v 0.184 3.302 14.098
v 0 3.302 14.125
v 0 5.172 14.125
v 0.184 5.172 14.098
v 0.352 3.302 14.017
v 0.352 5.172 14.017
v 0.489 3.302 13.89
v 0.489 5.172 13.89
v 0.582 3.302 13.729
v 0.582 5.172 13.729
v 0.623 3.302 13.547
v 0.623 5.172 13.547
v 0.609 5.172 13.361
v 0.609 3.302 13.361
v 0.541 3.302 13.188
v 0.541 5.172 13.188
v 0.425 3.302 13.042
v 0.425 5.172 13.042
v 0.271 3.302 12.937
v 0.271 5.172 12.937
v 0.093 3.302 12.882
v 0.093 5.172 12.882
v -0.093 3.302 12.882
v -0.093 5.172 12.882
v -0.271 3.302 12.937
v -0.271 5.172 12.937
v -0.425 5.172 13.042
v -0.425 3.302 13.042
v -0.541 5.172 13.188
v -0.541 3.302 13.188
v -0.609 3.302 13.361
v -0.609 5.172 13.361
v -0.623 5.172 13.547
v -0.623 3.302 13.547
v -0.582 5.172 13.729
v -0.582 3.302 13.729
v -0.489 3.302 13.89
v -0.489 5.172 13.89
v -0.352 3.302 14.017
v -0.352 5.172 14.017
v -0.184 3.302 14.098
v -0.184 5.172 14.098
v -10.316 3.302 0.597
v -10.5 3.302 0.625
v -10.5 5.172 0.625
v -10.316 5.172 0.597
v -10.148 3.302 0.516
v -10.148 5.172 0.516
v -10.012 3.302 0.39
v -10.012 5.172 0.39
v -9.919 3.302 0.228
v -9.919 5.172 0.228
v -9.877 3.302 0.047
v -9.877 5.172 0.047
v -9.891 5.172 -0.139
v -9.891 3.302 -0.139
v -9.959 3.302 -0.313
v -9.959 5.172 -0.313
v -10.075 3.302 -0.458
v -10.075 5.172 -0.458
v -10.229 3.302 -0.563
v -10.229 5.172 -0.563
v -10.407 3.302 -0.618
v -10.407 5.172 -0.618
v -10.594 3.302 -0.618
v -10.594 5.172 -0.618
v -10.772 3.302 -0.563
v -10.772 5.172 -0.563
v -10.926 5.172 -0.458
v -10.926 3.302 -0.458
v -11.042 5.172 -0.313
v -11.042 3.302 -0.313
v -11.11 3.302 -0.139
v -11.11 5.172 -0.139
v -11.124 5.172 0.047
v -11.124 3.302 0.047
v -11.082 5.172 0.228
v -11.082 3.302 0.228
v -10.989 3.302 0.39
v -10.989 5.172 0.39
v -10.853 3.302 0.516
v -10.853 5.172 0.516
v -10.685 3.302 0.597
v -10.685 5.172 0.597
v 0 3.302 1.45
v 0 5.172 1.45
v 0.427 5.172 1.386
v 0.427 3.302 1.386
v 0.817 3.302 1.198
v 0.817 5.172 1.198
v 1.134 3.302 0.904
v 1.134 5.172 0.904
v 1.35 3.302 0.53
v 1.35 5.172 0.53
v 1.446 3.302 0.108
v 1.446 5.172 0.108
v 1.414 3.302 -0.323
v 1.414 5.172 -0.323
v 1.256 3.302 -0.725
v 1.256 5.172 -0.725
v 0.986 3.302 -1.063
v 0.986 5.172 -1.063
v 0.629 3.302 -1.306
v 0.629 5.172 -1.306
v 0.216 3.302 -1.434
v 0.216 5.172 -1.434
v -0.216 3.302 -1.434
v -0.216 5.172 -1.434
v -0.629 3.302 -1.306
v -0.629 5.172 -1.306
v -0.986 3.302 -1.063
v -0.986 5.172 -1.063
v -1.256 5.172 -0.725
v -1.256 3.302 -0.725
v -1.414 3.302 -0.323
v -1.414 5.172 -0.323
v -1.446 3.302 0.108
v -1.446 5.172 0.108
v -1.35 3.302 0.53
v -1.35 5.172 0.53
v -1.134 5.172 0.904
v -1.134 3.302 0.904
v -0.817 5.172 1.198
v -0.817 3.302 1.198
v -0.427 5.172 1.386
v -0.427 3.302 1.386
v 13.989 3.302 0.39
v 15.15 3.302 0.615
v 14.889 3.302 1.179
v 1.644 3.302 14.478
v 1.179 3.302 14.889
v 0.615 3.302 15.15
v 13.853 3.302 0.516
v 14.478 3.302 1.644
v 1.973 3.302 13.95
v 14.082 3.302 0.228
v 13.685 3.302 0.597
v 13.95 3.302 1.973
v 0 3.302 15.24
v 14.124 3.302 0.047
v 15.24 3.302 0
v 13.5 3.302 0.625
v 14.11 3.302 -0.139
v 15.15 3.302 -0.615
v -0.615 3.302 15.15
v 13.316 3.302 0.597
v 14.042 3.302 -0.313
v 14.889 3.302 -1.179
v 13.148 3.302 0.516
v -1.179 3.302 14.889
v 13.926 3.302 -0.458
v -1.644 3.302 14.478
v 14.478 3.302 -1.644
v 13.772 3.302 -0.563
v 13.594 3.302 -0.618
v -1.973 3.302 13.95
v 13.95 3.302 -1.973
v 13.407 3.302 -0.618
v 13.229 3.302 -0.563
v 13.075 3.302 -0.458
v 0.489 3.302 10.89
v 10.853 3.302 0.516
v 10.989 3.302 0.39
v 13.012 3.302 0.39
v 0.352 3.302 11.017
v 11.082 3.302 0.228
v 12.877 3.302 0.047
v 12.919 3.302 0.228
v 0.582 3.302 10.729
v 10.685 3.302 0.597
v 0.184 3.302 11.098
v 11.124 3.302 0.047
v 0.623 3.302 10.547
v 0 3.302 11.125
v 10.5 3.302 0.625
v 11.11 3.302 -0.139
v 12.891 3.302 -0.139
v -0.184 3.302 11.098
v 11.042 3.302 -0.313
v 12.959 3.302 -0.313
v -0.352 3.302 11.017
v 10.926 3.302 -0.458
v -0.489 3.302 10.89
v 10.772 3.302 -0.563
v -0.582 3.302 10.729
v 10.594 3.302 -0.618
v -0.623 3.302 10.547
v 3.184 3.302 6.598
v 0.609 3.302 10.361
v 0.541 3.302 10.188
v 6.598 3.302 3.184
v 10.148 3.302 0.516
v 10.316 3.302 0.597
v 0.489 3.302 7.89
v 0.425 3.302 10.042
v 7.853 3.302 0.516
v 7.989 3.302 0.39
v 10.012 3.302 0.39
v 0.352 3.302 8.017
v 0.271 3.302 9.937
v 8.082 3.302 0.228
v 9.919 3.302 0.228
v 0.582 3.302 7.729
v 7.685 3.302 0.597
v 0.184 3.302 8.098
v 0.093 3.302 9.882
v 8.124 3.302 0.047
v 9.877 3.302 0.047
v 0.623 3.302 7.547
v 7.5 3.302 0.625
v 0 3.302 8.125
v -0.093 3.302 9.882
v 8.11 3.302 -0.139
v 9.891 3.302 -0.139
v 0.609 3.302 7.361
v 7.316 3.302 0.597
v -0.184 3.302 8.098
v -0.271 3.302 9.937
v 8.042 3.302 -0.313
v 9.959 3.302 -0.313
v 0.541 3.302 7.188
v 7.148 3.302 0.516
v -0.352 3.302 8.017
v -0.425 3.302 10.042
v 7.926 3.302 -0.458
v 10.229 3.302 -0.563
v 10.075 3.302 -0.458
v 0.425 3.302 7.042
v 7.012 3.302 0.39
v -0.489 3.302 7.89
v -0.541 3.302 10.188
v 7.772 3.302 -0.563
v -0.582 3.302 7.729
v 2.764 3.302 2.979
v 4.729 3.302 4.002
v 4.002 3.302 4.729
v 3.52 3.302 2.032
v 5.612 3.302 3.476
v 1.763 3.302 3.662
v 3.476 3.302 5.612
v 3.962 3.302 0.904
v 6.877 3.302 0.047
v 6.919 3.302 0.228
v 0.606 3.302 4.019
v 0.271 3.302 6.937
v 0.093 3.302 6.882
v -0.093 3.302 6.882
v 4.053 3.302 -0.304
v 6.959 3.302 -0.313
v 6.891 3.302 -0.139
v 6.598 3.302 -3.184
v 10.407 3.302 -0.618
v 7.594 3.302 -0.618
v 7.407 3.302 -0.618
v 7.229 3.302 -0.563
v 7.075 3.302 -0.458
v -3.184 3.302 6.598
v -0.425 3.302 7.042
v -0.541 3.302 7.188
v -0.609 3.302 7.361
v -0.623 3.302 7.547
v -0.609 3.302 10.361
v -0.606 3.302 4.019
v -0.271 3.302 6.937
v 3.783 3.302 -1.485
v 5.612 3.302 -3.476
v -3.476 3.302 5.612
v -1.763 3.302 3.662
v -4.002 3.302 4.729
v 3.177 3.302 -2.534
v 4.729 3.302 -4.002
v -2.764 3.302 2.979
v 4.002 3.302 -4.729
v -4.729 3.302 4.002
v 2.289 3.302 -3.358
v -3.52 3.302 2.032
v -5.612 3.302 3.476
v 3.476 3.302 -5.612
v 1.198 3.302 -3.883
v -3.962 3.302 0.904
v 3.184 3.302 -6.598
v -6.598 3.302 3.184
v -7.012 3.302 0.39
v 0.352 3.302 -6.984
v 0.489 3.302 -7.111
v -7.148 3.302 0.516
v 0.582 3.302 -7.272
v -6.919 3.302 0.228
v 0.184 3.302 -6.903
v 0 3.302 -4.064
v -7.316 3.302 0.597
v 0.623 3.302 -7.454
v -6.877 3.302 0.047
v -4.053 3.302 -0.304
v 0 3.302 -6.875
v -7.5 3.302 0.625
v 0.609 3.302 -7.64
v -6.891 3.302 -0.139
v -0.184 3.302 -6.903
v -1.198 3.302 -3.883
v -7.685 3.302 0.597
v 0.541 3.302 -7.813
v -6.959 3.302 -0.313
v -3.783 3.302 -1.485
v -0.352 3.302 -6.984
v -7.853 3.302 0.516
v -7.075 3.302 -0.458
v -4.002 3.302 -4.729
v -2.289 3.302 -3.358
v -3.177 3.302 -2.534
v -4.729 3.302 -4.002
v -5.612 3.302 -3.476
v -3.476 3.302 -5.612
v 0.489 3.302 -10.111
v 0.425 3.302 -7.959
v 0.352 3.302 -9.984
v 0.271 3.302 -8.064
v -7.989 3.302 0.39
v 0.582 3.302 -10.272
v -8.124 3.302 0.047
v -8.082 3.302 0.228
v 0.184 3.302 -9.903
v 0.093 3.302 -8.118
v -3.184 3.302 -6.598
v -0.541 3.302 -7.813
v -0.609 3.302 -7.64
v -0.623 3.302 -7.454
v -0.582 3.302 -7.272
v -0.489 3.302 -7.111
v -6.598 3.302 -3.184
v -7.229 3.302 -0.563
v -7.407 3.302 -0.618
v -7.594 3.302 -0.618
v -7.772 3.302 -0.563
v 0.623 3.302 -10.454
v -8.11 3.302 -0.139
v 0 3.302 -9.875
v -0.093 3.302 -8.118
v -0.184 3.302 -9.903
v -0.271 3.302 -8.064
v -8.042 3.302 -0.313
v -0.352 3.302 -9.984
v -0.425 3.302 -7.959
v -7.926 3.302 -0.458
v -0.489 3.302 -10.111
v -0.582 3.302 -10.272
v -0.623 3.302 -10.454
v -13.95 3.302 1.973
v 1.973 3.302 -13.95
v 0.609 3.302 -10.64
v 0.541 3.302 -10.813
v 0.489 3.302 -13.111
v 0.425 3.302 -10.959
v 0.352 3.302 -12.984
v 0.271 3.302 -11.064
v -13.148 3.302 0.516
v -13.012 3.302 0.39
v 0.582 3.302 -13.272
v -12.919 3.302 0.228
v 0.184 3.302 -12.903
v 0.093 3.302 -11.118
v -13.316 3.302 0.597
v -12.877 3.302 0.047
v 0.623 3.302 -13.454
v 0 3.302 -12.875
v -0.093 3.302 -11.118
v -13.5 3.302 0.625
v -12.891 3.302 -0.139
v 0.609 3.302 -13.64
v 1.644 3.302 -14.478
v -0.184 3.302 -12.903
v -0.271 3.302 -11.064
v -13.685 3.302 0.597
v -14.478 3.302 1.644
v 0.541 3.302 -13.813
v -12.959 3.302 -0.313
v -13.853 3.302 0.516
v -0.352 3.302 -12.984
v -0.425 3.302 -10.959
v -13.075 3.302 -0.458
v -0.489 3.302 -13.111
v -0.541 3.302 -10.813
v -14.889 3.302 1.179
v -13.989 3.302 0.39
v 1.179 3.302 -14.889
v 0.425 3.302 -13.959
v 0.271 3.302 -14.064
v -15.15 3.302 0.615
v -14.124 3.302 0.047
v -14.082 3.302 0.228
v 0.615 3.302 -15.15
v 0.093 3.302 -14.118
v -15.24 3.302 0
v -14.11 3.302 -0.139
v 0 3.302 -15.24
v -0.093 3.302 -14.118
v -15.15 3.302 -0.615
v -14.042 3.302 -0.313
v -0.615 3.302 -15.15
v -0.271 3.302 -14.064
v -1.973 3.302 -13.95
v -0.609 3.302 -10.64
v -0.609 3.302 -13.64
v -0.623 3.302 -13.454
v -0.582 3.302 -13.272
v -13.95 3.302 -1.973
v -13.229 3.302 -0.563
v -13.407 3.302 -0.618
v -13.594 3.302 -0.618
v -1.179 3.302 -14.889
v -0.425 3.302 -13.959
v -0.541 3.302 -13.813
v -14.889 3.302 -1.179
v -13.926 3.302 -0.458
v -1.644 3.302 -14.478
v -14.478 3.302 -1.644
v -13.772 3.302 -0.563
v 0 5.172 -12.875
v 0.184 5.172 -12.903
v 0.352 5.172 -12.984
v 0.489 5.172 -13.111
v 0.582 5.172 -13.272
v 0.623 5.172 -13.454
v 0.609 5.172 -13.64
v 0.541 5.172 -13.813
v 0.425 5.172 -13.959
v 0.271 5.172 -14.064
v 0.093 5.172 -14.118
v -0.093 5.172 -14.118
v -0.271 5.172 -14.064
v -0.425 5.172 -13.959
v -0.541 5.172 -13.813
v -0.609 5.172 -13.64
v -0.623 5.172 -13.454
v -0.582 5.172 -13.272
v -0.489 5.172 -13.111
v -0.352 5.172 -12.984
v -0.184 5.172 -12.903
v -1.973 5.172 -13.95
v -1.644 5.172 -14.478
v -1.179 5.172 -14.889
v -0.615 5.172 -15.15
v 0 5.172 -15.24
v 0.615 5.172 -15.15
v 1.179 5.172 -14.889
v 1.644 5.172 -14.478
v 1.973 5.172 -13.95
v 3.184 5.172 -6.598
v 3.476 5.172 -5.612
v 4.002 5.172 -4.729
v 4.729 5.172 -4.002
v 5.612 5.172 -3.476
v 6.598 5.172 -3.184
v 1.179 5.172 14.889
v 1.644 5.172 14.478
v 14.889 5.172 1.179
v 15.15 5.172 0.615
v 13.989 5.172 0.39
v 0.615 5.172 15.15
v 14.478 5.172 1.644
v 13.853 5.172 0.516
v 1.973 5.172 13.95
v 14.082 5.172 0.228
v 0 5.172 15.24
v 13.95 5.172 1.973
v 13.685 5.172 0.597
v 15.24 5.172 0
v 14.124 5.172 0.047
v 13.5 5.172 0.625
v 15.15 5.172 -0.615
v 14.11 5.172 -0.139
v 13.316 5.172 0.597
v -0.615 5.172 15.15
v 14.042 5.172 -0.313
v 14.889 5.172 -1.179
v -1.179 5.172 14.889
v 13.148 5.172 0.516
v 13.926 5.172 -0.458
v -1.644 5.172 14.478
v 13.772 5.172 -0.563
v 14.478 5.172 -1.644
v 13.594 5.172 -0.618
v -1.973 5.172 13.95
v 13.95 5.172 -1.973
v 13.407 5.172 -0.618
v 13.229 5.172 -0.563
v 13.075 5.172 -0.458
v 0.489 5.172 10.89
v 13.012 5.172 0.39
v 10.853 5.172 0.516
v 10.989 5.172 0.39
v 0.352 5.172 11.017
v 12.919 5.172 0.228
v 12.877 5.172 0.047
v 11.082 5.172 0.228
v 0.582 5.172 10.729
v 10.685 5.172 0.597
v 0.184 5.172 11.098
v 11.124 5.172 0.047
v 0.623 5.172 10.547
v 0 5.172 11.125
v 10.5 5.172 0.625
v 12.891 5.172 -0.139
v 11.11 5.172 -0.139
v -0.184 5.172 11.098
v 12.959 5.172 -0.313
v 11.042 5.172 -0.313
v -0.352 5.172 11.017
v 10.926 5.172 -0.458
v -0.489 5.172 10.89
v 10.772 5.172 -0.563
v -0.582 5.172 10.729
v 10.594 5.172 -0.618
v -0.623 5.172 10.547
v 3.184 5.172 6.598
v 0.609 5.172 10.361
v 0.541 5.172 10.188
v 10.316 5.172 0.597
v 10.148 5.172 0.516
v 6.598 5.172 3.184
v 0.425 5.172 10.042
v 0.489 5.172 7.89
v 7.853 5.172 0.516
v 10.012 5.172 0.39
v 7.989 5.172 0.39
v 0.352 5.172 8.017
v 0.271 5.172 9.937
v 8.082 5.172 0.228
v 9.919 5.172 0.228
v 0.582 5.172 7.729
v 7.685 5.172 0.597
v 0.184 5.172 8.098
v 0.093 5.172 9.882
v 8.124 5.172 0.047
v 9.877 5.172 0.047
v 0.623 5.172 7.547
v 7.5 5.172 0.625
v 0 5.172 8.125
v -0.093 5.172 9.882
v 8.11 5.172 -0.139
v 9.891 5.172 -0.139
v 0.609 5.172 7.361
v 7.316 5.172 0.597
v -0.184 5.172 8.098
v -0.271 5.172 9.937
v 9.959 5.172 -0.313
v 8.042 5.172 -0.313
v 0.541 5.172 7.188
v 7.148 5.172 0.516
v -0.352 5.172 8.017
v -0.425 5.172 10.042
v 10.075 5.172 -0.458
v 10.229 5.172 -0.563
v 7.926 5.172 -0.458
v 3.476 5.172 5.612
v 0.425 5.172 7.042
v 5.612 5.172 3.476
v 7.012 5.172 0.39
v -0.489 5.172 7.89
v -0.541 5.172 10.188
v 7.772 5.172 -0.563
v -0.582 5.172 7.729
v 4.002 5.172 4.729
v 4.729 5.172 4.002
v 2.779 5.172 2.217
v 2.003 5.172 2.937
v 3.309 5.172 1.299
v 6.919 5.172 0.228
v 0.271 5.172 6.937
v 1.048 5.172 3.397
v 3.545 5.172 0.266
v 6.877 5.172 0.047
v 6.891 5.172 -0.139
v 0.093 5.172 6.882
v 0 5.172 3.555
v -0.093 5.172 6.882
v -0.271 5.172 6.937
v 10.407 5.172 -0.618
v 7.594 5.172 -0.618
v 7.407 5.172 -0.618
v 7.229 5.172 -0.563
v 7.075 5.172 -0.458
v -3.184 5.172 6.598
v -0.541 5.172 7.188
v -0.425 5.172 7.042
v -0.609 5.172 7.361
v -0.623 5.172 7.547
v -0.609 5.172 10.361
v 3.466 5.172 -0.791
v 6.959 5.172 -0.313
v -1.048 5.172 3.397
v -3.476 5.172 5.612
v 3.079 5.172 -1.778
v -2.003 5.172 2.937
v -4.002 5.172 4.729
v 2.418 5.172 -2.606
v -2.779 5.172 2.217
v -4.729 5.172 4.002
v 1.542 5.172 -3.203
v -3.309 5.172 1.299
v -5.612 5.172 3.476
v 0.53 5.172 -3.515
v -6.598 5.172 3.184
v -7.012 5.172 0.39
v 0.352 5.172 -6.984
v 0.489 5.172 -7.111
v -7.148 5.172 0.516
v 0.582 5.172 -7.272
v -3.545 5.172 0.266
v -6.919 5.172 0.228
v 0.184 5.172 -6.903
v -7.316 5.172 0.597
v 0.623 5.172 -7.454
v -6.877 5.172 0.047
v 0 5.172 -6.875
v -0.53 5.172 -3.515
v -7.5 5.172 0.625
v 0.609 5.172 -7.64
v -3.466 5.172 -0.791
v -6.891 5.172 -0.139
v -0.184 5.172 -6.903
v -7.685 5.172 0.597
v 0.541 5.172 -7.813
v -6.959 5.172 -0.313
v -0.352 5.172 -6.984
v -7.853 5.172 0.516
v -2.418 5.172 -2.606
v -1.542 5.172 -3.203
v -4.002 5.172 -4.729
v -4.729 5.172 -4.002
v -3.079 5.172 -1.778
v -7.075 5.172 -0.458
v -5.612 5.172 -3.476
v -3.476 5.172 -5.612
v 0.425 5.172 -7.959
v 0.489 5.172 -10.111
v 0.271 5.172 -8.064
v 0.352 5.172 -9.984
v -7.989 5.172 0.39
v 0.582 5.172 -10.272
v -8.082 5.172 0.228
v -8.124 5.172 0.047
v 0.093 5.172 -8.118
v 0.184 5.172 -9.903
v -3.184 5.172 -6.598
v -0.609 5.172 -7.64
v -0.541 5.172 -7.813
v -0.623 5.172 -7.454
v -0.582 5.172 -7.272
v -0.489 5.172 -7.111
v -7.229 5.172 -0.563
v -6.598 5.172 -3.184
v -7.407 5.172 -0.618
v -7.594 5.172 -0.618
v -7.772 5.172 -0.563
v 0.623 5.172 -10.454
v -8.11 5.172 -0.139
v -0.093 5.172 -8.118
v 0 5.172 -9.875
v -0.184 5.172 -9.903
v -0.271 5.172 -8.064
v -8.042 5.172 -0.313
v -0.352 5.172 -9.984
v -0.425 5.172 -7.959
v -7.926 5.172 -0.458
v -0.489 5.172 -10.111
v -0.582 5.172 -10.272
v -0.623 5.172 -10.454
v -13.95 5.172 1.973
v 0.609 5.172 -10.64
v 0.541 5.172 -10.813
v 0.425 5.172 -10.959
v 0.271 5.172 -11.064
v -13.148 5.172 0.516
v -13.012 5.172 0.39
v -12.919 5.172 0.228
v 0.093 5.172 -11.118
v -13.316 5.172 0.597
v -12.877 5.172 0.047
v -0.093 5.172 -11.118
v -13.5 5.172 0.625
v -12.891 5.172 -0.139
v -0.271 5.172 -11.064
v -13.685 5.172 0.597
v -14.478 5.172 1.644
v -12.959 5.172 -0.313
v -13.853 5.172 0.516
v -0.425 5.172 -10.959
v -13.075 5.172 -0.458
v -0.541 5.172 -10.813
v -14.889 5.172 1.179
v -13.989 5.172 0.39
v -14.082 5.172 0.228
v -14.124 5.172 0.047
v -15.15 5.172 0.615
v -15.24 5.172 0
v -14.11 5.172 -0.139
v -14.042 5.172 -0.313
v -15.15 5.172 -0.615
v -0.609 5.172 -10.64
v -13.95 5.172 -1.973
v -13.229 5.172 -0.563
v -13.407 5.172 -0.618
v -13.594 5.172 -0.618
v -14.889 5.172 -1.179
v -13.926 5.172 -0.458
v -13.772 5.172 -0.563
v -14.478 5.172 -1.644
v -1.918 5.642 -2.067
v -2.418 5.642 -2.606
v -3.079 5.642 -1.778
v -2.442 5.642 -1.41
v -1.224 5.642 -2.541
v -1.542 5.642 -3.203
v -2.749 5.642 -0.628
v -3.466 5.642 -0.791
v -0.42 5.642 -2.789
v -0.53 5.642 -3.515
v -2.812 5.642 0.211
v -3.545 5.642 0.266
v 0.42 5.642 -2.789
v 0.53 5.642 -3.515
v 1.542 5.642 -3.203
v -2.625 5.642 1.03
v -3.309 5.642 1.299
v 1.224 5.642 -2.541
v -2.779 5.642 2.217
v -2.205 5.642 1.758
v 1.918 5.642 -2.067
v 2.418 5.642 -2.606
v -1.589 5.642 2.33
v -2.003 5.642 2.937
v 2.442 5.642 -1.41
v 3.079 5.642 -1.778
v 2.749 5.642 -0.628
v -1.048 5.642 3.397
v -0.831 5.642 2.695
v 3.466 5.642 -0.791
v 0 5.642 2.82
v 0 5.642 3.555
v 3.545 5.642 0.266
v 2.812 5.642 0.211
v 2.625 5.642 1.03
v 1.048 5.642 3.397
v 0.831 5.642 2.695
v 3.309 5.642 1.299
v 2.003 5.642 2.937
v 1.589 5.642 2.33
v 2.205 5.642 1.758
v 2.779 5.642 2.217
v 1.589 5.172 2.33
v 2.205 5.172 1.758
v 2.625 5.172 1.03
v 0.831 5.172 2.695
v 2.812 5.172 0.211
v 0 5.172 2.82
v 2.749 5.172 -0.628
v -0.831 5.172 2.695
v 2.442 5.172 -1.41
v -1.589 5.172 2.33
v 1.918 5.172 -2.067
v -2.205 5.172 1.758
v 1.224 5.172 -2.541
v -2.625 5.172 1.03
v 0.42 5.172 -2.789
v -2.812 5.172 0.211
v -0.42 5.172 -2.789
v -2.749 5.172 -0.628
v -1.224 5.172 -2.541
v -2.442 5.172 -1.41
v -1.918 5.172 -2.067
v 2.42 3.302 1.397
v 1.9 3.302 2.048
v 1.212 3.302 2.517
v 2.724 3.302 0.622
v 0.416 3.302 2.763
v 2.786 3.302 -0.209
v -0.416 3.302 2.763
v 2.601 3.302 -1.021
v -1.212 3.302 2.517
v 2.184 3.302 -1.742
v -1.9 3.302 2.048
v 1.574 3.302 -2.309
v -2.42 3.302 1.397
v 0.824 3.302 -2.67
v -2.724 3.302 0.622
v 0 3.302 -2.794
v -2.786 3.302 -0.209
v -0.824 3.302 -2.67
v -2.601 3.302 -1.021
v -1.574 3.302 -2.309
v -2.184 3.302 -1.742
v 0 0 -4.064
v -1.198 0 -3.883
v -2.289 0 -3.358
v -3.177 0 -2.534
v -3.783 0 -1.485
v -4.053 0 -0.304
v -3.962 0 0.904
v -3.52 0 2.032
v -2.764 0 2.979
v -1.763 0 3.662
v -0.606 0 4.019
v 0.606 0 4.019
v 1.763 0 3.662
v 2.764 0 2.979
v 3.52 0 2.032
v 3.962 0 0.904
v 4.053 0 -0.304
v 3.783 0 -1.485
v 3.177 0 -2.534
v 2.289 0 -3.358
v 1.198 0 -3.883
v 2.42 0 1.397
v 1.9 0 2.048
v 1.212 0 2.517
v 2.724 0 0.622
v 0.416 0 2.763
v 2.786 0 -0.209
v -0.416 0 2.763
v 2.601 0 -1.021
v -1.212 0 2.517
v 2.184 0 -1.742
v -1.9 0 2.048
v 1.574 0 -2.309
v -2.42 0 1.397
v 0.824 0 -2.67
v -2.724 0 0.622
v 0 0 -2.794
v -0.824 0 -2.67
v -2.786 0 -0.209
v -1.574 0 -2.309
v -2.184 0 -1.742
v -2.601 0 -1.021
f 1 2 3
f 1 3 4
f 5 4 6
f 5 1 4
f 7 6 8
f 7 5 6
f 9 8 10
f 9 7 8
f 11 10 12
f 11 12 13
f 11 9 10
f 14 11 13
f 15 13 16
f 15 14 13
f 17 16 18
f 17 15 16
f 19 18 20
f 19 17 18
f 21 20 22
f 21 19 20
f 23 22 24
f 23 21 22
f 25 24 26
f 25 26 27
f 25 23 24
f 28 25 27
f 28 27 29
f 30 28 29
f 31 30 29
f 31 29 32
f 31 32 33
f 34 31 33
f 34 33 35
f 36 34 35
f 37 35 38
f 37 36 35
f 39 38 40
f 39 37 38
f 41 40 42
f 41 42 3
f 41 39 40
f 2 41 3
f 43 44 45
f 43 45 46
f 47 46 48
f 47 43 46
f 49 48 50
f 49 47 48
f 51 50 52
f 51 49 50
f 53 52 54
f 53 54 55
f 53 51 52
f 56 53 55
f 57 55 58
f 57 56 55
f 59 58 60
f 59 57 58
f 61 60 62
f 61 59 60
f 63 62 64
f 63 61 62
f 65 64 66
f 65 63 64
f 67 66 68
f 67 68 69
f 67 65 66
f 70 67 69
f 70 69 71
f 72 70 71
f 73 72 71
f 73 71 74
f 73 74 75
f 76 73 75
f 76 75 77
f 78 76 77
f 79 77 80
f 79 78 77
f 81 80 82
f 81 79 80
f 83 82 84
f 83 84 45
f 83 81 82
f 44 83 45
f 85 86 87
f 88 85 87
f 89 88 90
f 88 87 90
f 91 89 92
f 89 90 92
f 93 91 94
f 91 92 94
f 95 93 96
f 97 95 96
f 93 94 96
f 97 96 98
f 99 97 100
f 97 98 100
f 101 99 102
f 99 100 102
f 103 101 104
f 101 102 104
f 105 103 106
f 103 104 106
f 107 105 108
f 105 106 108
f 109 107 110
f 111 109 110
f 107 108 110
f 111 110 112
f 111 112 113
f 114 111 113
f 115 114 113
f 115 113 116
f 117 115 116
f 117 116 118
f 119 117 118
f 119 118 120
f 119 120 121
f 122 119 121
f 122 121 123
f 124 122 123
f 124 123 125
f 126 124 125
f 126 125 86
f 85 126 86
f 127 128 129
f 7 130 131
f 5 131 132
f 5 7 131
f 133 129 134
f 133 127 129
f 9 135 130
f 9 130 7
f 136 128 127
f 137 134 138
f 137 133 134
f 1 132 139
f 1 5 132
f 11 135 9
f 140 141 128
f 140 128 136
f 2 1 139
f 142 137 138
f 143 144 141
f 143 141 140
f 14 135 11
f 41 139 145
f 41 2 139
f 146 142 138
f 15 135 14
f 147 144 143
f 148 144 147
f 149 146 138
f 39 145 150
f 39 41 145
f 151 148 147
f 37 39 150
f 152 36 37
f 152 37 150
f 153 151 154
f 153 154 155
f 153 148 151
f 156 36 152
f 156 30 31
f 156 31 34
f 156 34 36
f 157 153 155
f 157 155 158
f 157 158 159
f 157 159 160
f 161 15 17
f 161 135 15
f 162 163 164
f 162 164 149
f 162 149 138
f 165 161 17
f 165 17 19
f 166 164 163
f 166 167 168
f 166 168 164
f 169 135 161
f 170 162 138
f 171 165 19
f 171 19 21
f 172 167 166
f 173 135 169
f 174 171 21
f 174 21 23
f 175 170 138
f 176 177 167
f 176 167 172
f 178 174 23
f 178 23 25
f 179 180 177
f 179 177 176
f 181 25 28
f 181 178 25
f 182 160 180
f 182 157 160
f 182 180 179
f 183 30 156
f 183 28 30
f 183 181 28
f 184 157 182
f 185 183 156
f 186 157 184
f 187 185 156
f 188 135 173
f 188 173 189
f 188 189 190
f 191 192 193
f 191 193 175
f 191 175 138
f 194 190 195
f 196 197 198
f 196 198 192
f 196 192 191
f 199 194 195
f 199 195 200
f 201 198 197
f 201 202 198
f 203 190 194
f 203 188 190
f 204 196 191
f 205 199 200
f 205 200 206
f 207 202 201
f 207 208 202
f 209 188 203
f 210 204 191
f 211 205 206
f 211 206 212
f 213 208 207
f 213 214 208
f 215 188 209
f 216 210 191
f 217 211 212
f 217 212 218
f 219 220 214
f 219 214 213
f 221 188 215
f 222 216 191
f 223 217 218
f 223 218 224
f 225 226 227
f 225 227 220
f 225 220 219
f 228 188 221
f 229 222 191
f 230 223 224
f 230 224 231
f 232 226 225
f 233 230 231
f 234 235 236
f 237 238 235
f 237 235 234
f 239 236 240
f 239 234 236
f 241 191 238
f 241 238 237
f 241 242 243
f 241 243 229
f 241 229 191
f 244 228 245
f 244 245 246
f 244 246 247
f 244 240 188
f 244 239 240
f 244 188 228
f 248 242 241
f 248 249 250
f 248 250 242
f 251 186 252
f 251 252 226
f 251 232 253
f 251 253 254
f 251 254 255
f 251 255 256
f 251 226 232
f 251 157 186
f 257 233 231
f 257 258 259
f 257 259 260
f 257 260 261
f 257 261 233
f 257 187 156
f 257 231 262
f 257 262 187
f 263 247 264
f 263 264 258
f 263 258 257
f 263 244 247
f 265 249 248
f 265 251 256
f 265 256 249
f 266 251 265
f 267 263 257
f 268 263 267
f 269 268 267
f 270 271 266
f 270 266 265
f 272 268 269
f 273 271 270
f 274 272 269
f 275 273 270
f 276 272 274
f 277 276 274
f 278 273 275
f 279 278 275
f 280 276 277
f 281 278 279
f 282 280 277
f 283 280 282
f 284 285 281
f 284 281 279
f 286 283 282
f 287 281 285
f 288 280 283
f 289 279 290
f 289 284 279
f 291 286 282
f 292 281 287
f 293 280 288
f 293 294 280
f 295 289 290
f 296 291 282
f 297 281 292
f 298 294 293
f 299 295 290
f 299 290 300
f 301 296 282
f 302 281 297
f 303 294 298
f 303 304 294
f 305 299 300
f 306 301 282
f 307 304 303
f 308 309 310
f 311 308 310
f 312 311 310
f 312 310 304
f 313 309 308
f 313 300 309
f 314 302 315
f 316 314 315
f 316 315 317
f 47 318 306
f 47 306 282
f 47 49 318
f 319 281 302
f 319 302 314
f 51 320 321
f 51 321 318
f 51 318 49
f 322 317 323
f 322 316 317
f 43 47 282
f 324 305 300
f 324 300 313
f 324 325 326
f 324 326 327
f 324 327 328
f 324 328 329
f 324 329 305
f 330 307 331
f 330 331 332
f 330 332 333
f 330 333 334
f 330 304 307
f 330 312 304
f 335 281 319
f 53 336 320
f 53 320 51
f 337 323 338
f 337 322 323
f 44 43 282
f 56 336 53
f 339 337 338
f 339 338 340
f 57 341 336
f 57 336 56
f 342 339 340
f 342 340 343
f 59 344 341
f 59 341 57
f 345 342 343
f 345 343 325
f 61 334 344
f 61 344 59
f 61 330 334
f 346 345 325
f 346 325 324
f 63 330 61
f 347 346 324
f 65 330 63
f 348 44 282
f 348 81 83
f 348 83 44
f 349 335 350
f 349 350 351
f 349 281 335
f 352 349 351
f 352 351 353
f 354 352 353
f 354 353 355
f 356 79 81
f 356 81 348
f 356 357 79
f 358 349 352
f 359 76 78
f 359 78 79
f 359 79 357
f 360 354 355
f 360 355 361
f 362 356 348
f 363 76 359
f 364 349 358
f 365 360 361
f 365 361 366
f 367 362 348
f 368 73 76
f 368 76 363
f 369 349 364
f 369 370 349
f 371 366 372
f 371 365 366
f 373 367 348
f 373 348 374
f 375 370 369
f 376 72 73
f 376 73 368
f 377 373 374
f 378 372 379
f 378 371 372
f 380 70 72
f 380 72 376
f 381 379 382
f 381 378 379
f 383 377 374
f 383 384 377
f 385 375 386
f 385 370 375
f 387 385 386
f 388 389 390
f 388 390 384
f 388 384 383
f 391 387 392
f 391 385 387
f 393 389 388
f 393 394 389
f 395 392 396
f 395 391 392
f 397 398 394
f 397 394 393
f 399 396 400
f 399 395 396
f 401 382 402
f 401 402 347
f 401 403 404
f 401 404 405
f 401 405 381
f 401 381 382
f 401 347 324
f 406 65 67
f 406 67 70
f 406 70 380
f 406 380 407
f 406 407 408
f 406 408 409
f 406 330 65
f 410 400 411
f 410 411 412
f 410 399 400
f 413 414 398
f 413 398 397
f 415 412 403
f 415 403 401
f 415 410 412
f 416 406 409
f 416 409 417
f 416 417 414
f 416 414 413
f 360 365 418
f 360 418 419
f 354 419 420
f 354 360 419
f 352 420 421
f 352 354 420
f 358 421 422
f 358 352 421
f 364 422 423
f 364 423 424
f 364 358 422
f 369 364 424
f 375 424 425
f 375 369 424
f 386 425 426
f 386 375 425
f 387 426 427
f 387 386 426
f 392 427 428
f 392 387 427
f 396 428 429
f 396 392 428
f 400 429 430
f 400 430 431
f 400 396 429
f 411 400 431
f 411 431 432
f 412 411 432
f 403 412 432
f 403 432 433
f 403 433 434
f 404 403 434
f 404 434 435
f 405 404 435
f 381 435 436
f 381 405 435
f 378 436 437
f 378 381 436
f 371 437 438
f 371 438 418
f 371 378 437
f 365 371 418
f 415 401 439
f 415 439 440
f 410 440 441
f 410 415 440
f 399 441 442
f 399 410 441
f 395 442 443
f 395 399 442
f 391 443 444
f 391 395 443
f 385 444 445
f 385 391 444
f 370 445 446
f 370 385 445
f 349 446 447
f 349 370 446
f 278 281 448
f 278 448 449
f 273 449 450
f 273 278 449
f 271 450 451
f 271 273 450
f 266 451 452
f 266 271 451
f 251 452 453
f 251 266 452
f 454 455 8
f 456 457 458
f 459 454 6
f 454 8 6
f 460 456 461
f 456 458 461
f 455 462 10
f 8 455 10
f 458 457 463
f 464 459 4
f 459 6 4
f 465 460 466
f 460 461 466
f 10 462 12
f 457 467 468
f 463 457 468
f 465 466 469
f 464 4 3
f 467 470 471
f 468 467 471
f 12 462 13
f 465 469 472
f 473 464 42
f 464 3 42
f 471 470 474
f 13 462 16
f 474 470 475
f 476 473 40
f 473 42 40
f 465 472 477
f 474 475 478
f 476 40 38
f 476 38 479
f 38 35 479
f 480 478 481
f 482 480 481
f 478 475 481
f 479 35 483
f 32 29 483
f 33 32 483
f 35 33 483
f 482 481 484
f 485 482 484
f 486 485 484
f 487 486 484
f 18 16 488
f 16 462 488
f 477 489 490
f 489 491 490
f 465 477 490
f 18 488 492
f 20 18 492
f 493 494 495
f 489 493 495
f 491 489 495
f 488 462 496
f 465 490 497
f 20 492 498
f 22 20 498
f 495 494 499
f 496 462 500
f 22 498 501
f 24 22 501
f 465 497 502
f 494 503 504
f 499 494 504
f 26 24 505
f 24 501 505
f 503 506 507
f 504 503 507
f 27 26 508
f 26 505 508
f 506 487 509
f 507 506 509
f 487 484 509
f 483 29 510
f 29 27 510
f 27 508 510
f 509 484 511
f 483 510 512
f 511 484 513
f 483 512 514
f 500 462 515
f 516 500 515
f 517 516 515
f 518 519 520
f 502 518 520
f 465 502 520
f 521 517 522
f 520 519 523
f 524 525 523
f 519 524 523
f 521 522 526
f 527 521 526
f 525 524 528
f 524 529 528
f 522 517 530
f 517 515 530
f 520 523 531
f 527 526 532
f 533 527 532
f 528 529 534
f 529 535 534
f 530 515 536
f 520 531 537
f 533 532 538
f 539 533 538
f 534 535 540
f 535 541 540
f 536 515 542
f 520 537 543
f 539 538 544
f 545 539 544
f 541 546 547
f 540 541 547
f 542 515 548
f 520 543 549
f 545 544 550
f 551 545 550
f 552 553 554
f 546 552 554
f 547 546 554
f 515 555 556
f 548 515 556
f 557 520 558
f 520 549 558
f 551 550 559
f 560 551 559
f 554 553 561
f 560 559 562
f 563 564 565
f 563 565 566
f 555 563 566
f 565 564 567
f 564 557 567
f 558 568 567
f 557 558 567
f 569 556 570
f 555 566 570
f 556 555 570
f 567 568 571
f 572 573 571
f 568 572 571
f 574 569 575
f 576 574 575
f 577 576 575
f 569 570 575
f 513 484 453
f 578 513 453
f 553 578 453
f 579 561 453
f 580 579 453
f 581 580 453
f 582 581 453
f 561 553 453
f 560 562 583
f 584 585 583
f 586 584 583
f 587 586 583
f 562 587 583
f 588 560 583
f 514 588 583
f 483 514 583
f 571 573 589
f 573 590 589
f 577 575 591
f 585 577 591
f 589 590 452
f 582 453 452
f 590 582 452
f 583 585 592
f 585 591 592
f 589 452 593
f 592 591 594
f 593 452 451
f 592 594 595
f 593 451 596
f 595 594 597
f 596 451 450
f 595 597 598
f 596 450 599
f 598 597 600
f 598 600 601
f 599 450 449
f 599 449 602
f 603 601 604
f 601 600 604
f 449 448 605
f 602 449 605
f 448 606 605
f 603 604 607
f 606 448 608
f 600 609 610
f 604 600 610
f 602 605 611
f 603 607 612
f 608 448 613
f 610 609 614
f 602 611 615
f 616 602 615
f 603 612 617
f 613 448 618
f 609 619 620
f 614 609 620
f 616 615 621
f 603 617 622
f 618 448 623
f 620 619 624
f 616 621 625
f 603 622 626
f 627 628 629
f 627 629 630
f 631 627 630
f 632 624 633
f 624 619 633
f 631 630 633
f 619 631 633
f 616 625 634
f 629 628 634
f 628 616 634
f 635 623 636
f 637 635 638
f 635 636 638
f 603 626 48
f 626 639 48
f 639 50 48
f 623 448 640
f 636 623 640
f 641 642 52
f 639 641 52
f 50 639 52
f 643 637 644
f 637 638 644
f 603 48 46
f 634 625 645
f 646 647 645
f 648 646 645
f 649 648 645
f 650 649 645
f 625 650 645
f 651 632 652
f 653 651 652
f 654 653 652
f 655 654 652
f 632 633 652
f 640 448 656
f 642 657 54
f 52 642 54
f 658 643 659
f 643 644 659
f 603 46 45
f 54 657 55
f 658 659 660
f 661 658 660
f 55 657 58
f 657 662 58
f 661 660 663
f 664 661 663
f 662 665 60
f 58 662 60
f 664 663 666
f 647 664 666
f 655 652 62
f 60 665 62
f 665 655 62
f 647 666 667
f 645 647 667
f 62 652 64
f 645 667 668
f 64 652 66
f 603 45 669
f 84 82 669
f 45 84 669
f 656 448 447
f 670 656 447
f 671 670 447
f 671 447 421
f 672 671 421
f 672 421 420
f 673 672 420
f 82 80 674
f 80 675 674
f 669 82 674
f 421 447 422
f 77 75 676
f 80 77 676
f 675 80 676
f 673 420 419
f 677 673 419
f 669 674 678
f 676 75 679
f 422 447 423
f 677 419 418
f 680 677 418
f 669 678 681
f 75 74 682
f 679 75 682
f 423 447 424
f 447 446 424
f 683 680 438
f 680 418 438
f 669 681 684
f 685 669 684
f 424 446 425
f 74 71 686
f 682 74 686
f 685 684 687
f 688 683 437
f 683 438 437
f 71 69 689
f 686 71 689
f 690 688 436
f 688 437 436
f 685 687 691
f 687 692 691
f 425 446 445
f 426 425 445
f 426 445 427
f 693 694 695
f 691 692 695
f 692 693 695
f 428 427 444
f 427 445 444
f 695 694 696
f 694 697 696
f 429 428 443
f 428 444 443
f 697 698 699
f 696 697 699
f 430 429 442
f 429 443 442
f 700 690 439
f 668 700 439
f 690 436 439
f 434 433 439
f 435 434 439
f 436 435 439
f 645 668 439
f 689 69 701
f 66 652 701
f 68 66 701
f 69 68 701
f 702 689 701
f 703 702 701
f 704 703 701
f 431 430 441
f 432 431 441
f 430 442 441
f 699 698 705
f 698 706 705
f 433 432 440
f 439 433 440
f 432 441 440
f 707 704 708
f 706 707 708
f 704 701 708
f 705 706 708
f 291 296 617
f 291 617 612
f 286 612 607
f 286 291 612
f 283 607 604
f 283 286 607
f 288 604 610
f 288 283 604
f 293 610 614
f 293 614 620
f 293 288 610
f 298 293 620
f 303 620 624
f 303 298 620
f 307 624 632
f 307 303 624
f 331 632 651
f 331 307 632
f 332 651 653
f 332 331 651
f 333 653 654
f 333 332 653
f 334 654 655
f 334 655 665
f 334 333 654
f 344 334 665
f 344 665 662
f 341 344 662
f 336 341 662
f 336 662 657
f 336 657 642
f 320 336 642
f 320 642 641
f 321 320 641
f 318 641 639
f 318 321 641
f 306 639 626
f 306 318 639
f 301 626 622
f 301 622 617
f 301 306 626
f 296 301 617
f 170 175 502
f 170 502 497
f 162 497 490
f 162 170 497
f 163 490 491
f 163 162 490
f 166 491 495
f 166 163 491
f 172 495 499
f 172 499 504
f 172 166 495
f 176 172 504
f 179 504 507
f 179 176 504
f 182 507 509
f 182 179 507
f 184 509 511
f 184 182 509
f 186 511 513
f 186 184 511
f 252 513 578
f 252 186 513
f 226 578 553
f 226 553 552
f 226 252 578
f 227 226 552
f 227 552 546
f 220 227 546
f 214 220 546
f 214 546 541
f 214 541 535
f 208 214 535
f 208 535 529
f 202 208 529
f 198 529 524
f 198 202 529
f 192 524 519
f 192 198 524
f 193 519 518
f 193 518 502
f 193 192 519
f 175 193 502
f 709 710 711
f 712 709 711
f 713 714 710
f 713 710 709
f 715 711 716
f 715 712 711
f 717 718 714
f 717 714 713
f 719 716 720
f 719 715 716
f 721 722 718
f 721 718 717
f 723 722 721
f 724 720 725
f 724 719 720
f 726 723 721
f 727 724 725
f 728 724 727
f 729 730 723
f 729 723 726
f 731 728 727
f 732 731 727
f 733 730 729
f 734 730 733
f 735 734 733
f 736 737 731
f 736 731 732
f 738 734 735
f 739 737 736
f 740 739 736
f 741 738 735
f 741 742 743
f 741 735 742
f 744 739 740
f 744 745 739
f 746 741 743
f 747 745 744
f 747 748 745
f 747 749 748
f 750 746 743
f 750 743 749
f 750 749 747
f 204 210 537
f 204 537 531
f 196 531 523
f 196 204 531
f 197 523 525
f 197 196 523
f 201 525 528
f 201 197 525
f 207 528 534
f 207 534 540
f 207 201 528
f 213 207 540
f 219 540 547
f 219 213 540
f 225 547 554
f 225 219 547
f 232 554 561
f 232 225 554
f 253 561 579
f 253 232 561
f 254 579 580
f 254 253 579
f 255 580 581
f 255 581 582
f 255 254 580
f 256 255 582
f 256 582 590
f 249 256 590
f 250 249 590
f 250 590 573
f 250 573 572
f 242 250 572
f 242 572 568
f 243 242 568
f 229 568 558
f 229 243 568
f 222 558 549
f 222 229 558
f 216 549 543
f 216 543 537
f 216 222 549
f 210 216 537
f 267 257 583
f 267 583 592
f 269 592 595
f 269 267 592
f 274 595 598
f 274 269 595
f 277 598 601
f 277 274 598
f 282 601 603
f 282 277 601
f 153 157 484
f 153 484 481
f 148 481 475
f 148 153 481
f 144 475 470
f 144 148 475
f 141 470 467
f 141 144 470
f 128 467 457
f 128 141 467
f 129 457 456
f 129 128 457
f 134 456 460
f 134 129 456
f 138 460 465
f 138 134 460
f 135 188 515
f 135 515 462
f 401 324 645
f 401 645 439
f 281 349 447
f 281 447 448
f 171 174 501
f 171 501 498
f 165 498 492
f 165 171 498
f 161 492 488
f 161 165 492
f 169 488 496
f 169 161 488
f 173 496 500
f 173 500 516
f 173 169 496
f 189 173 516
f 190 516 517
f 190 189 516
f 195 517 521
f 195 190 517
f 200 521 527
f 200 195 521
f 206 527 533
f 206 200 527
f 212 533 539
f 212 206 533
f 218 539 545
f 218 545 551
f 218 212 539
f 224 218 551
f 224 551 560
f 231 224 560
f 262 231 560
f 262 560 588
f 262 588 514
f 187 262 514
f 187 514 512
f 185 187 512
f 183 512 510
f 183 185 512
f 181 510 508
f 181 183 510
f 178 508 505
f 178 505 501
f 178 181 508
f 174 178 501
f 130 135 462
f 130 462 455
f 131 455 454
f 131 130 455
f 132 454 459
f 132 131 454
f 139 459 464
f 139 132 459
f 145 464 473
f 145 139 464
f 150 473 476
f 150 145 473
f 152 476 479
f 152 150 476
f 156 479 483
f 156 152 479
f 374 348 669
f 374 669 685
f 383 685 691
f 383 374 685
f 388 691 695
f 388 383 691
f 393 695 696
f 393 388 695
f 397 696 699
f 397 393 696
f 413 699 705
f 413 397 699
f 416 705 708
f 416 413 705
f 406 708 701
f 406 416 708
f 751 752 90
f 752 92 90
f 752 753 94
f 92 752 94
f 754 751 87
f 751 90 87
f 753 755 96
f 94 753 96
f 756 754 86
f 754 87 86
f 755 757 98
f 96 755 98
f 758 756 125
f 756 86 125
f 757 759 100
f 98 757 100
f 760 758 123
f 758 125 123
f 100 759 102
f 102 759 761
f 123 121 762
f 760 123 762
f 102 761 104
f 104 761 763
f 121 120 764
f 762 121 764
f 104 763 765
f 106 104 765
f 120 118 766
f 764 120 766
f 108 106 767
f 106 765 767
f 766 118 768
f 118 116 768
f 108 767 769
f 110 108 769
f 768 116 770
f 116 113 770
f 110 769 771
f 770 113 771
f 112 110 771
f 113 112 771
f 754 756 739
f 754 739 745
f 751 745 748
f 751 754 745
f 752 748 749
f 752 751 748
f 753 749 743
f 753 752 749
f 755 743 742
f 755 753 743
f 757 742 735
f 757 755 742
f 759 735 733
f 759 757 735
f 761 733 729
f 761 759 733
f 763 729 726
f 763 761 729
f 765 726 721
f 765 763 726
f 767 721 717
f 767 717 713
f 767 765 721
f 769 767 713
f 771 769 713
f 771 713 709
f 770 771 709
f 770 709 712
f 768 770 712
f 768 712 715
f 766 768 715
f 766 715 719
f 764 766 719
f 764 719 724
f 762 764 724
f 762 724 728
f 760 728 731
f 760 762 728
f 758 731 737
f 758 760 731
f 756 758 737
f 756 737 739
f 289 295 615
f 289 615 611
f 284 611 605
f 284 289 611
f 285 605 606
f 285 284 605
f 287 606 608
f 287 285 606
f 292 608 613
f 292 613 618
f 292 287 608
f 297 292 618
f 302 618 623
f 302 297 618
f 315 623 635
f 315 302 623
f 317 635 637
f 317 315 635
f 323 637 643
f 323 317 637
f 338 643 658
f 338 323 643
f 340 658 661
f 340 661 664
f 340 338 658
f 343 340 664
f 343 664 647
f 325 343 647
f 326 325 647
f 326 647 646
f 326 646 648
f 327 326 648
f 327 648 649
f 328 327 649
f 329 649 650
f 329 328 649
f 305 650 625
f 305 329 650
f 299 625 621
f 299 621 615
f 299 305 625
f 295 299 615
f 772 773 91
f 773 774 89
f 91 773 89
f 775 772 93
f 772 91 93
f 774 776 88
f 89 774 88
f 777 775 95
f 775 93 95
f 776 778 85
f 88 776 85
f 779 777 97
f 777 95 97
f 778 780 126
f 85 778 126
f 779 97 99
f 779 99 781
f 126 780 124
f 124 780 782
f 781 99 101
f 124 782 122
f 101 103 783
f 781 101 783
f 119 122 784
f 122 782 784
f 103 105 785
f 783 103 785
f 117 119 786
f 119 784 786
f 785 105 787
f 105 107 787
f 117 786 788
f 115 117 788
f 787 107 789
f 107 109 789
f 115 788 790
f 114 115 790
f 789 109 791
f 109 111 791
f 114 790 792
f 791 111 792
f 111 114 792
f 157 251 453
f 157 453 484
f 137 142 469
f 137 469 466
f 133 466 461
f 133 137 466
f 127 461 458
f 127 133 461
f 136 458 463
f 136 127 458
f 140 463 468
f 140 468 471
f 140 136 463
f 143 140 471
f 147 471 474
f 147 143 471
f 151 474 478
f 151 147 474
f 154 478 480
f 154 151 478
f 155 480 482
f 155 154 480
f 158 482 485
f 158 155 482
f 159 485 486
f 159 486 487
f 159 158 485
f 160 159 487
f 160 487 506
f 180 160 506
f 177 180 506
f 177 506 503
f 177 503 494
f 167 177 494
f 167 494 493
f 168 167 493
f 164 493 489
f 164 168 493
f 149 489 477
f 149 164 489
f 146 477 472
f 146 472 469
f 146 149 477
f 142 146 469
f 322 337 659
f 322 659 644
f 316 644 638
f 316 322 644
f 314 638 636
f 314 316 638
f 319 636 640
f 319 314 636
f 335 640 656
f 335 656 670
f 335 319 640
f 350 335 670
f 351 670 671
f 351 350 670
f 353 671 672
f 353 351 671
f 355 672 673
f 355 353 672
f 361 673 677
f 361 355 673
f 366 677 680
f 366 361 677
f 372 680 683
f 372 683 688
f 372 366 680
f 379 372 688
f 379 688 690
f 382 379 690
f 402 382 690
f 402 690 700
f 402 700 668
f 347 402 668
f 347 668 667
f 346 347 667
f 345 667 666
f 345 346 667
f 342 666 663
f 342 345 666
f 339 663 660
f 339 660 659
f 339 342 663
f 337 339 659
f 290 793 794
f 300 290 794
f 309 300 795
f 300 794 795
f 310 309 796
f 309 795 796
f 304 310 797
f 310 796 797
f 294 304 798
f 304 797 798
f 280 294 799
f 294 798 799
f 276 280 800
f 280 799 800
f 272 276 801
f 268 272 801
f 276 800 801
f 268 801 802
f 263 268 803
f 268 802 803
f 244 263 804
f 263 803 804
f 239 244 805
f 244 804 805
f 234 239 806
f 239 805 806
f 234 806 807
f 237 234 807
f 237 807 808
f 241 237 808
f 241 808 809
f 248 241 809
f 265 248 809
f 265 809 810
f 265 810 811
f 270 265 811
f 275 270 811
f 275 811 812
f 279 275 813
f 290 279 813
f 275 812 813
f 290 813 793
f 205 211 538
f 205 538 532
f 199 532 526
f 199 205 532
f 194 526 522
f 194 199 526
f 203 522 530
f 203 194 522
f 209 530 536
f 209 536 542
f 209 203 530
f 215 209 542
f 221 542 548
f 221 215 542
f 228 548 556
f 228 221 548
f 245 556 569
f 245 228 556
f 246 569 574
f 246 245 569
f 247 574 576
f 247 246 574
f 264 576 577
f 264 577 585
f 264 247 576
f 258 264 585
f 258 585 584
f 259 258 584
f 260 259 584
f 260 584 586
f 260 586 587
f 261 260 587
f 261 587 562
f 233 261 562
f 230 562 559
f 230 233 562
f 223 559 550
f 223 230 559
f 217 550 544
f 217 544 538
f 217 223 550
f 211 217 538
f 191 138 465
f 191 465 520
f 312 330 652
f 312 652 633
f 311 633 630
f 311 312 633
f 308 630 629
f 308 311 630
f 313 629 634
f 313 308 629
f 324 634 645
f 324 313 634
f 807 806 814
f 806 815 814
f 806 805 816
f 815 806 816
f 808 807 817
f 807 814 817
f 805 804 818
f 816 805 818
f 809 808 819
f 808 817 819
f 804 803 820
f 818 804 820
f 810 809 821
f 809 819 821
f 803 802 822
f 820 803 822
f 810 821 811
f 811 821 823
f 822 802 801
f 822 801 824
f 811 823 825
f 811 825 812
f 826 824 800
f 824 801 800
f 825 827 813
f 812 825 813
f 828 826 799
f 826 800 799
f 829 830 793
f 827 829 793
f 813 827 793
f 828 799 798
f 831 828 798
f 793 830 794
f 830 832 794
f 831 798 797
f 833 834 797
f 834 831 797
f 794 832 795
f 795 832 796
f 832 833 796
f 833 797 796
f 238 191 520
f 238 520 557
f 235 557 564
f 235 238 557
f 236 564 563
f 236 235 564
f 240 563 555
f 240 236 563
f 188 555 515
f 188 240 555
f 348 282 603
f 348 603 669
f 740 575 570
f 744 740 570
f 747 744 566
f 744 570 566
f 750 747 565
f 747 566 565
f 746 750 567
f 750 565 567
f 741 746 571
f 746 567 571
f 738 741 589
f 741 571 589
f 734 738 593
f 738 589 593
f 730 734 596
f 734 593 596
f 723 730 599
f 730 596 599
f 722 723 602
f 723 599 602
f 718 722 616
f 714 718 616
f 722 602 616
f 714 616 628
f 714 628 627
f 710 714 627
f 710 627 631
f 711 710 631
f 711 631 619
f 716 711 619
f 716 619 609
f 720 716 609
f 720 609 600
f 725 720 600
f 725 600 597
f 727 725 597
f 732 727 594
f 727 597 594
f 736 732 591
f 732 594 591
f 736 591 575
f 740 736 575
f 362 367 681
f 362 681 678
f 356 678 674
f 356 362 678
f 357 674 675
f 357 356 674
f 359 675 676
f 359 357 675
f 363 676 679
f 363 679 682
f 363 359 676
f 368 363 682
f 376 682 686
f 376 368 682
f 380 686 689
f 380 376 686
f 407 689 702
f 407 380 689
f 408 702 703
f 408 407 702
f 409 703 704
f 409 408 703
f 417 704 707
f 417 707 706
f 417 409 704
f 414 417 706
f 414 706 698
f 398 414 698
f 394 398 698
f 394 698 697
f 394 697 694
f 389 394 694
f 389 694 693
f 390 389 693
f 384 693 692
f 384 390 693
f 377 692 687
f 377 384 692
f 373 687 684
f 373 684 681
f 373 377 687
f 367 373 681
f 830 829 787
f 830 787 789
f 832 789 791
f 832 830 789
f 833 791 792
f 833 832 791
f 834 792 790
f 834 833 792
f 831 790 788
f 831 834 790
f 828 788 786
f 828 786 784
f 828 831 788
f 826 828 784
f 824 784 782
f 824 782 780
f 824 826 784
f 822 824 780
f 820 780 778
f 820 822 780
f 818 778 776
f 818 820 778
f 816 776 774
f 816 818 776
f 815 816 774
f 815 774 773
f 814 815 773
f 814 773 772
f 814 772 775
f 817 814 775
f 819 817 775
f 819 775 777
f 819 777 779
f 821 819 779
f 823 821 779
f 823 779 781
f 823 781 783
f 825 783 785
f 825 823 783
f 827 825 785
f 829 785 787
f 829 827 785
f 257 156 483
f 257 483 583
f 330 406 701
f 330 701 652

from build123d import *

# Parameters (mm, degrees)
SKETCH1_R           = 4.064
SKETCH1_R_2         = 2.794
BOSS_EXTRUDE1_DEPTH = 3.302
SKETCH2_R           = 0.62500002
SKETCH2_R_2         = 4.064
SKETCH2_R_3         = 2.794
BOSS_EXTRUDE2_DEPTH = 1.87000007
SKETCH6_R           = 1.449999894
CUT_EXTRUDE6_DEPTH  = 23.164493782
SKETCH7_R           = 3.555000002
SKETCH7_R_2         = 2.819999948
BOSS_EXTRUDE3_DEPTH = 0.470000076


with BuildPart() as part:
    # Sketch1 → Boss-Extrude1 (new body)
    with BuildSketch(Plane(origin=(0, 0, 0), x_dir=(1, 0, 0), z_dir=(0, 1, 0))):
        with Locations(Location((0, 0, 0), (0, 0, 90))):
            Circle(SKETCH1_R)
        with Locations(Location((0, 0, 0), (0, 0, 90))):
            Circle(SKETCH1_R_2, mode=Mode.SUBTRACT)
    extrude(amount=BOSS_EXTRUDE1_DEPTH)

    # Sketch2 → Boss-Extrude2 (add)
    # profile 1 of 3: a face of its own
    with BuildSketch(Plane(origin=(0, 3.302, 0), x_dir=(1, 0, 0), z_dir=(0, 1, 0))):
        with BuildLine():
            ThreePointArc((-6.598095019, 3.184398134), (-4.342465091, 4.342465091), (-3.184398134, 6.598095019))
            Line((-3.184398134, 6.598095019), (-1.973411671, 13.950499547))
            ThreePointArc((-1.973411671, 13.950499547), (-1e-09, 15.239999998), (1.973411671, 13.950499548))
            Line((1.973411671, 13.950499548), (3.184398134, 6.598095019))
            ThreePointArc((3.184398134, 6.598095019), (4.342465091, 4.342465091), (6.598095019, 3.184398134))
            Line((6.598095019, 3.184398134), (13.950499547, 1.973411671))
            ThreePointArc((13.950499547, 1.973411671), (15.239999998, 1e-09), (13.950499548, -1.973411671))
            Line((13.950499548, -1.973411671), (6.598095019, -3.184398134))
            ThreePointArc((6.598095019, -3.184398134), (4.342465091, -4.342465091), (3.184398134, -6.598095019))
            Line((3.184398134, -6.598095019), (1.973411671, -13.950499547))
            ThreePointArc((1.973411671, -13.950499547), (1e-09, -15.239999998), (-1.973411671, -13.950499548))
            Line((-1.973411671, -13.950499548), (-3.184398134, -6.598095019))
            ThreePointArc((-3.184398134, -6.598095019), (-4.342465091, -4.342465091), (-6.598095019, -3.184398134))
            Line((-6.598095019, -3.184398134), (-13.950499547, -1.973411671))
            ThreePointArc((-13.950499547, -1.973411671), (-15.239999998, -1e-09), (-13.950499548, 1.973411671))
            Line((-13.950499548, 1.973411671), (-6.598095019, 3.184398134))
        make_face()
        with Locations(Location((-13.500466522, 0, 0), (0, 0, 270))):
            Circle(SKETCH2_R, mode=Mode.SUBTRACT)
        with Locations(Location((-10.500466426, 0, 0), (0, 0, 270))):
            Circle(SKETCH2_R, mode=Mode.SUBTRACT)
        with Locations(Location((-7.50046633, 0, 0), (0, 0, 270))):
            Circle(SKETCH2_R, mode=Mode.SUBTRACT)
        with Locations(Location((13.500466522, 0, 0), (0, 0, 270))):
            Circle(SKETCH2_R, mode=Mode.SUBTRACT)
        with Locations(Location((10.500466426, 0, 0), (0, 0, 270))):
            Circle(SKETCH2_R, mode=Mode.SUBTRACT)
        with Locations(Location((7.50046633, 0, 0), (0, 0, 270))):
            Circle(SKETCH2_R, mode=Mode.SUBTRACT)
        with Locations(Location((0, 7.50046633, 0), (0, 0, 270))):
            Circle(SKETCH2_R, mode=Mode.SUBTRACT)
        with Locations(Location((0, 10.500466426, 0), (0, 0, 270))):
            Circle(SKETCH2_R, mode=Mode.SUBTRACT)
        with Locations(Location((0, 13.500466522, 0), (0, 0, 270))):
            Circle(SKETCH2_R, mode=Mode.SUBTRACT)
        with Locations(Location((0, -13.500466522, 0), (0, 0, 270))):
            Circle(SKETCH2_R, mode=Mode.SUBTRACT)
        with Locations(Location((0, -10.500466426, 0), (0, 0, 270))):
            Circle(SKETCH2_R, mode=Mode.SUBTRACT)
        with Locations(Location((0, -7.50046633, 0), (0, 0, 270))):
            Circle(SKETCH2_R, mode=Mode.SUBTRACT)
        with Locations(Location((0, 0, 0), (0, 0, 90))):
            Circle(SKETCH2_R_2, mode=Mode.SUBTRACT)
    # profile 2 of 3: a face of its own
    with BuildSketch(Plane(origin=(0, 3.302, 0), x_dir=(1, 0, 0), z_dir=(0, 1, 0))):
        with Locations(Location((0, 0, 0), (0, 0, 90))):
            Circle(SKETCH2_R_2)
        with Locations(Location((0, 0, 0), (0, 0, 90))):
            Circle(SKETCH2_R_3, mode=Mode.SUBTRACT)
    # profile 3 of 3: a face of its own
    with BuildSketch(Plane(origin=(0, 3.302, 0), x_dir=(1, 0, 0), z_dir=(0, 1, 0))):
        with Locations(Location((0, 0, 0), (0, 0, 90))):
            Circle(SKETCH2_R_3)
    extrude(amount=BOSS_EXTRUDE2_DEPTH)

    # Sketch6 → Cut-Extrude6 (cut, through all)
    with BuildSketch(Plane(origin=(0, 5.17200007, 0), x_dir=(1, 0, 0), z_dir=(0, 1, 0))):
        with Locations(Location((0, 0, 0), (0, 0, 270))):
            Circle(SKETCH6_R)
    extrude(amount=-CUT_EXTRUDE6_DEPTH, mode=Mode.SUBTRACT)

    # Sketch7 → Boss-Extrude3 (add)
    with BuildSketch(Plane(origin=(0, 5.17200007, 0), x_dir=(1, 0, 0), z_dir=(0, 1, 0))):
        with Locations(Location((0, 0, 0), (0, 0, 270))):
            Circle(SKETCH7_R)
        with Locations(Location((0, 0, 0), (0, 0, 270))):
            Circle(SKETCH7_R_2, mode=Mode.SUBTRACT)
    extrude(amount=BOSS_EXTRUDE3_DEPTH)


solid = part.part
